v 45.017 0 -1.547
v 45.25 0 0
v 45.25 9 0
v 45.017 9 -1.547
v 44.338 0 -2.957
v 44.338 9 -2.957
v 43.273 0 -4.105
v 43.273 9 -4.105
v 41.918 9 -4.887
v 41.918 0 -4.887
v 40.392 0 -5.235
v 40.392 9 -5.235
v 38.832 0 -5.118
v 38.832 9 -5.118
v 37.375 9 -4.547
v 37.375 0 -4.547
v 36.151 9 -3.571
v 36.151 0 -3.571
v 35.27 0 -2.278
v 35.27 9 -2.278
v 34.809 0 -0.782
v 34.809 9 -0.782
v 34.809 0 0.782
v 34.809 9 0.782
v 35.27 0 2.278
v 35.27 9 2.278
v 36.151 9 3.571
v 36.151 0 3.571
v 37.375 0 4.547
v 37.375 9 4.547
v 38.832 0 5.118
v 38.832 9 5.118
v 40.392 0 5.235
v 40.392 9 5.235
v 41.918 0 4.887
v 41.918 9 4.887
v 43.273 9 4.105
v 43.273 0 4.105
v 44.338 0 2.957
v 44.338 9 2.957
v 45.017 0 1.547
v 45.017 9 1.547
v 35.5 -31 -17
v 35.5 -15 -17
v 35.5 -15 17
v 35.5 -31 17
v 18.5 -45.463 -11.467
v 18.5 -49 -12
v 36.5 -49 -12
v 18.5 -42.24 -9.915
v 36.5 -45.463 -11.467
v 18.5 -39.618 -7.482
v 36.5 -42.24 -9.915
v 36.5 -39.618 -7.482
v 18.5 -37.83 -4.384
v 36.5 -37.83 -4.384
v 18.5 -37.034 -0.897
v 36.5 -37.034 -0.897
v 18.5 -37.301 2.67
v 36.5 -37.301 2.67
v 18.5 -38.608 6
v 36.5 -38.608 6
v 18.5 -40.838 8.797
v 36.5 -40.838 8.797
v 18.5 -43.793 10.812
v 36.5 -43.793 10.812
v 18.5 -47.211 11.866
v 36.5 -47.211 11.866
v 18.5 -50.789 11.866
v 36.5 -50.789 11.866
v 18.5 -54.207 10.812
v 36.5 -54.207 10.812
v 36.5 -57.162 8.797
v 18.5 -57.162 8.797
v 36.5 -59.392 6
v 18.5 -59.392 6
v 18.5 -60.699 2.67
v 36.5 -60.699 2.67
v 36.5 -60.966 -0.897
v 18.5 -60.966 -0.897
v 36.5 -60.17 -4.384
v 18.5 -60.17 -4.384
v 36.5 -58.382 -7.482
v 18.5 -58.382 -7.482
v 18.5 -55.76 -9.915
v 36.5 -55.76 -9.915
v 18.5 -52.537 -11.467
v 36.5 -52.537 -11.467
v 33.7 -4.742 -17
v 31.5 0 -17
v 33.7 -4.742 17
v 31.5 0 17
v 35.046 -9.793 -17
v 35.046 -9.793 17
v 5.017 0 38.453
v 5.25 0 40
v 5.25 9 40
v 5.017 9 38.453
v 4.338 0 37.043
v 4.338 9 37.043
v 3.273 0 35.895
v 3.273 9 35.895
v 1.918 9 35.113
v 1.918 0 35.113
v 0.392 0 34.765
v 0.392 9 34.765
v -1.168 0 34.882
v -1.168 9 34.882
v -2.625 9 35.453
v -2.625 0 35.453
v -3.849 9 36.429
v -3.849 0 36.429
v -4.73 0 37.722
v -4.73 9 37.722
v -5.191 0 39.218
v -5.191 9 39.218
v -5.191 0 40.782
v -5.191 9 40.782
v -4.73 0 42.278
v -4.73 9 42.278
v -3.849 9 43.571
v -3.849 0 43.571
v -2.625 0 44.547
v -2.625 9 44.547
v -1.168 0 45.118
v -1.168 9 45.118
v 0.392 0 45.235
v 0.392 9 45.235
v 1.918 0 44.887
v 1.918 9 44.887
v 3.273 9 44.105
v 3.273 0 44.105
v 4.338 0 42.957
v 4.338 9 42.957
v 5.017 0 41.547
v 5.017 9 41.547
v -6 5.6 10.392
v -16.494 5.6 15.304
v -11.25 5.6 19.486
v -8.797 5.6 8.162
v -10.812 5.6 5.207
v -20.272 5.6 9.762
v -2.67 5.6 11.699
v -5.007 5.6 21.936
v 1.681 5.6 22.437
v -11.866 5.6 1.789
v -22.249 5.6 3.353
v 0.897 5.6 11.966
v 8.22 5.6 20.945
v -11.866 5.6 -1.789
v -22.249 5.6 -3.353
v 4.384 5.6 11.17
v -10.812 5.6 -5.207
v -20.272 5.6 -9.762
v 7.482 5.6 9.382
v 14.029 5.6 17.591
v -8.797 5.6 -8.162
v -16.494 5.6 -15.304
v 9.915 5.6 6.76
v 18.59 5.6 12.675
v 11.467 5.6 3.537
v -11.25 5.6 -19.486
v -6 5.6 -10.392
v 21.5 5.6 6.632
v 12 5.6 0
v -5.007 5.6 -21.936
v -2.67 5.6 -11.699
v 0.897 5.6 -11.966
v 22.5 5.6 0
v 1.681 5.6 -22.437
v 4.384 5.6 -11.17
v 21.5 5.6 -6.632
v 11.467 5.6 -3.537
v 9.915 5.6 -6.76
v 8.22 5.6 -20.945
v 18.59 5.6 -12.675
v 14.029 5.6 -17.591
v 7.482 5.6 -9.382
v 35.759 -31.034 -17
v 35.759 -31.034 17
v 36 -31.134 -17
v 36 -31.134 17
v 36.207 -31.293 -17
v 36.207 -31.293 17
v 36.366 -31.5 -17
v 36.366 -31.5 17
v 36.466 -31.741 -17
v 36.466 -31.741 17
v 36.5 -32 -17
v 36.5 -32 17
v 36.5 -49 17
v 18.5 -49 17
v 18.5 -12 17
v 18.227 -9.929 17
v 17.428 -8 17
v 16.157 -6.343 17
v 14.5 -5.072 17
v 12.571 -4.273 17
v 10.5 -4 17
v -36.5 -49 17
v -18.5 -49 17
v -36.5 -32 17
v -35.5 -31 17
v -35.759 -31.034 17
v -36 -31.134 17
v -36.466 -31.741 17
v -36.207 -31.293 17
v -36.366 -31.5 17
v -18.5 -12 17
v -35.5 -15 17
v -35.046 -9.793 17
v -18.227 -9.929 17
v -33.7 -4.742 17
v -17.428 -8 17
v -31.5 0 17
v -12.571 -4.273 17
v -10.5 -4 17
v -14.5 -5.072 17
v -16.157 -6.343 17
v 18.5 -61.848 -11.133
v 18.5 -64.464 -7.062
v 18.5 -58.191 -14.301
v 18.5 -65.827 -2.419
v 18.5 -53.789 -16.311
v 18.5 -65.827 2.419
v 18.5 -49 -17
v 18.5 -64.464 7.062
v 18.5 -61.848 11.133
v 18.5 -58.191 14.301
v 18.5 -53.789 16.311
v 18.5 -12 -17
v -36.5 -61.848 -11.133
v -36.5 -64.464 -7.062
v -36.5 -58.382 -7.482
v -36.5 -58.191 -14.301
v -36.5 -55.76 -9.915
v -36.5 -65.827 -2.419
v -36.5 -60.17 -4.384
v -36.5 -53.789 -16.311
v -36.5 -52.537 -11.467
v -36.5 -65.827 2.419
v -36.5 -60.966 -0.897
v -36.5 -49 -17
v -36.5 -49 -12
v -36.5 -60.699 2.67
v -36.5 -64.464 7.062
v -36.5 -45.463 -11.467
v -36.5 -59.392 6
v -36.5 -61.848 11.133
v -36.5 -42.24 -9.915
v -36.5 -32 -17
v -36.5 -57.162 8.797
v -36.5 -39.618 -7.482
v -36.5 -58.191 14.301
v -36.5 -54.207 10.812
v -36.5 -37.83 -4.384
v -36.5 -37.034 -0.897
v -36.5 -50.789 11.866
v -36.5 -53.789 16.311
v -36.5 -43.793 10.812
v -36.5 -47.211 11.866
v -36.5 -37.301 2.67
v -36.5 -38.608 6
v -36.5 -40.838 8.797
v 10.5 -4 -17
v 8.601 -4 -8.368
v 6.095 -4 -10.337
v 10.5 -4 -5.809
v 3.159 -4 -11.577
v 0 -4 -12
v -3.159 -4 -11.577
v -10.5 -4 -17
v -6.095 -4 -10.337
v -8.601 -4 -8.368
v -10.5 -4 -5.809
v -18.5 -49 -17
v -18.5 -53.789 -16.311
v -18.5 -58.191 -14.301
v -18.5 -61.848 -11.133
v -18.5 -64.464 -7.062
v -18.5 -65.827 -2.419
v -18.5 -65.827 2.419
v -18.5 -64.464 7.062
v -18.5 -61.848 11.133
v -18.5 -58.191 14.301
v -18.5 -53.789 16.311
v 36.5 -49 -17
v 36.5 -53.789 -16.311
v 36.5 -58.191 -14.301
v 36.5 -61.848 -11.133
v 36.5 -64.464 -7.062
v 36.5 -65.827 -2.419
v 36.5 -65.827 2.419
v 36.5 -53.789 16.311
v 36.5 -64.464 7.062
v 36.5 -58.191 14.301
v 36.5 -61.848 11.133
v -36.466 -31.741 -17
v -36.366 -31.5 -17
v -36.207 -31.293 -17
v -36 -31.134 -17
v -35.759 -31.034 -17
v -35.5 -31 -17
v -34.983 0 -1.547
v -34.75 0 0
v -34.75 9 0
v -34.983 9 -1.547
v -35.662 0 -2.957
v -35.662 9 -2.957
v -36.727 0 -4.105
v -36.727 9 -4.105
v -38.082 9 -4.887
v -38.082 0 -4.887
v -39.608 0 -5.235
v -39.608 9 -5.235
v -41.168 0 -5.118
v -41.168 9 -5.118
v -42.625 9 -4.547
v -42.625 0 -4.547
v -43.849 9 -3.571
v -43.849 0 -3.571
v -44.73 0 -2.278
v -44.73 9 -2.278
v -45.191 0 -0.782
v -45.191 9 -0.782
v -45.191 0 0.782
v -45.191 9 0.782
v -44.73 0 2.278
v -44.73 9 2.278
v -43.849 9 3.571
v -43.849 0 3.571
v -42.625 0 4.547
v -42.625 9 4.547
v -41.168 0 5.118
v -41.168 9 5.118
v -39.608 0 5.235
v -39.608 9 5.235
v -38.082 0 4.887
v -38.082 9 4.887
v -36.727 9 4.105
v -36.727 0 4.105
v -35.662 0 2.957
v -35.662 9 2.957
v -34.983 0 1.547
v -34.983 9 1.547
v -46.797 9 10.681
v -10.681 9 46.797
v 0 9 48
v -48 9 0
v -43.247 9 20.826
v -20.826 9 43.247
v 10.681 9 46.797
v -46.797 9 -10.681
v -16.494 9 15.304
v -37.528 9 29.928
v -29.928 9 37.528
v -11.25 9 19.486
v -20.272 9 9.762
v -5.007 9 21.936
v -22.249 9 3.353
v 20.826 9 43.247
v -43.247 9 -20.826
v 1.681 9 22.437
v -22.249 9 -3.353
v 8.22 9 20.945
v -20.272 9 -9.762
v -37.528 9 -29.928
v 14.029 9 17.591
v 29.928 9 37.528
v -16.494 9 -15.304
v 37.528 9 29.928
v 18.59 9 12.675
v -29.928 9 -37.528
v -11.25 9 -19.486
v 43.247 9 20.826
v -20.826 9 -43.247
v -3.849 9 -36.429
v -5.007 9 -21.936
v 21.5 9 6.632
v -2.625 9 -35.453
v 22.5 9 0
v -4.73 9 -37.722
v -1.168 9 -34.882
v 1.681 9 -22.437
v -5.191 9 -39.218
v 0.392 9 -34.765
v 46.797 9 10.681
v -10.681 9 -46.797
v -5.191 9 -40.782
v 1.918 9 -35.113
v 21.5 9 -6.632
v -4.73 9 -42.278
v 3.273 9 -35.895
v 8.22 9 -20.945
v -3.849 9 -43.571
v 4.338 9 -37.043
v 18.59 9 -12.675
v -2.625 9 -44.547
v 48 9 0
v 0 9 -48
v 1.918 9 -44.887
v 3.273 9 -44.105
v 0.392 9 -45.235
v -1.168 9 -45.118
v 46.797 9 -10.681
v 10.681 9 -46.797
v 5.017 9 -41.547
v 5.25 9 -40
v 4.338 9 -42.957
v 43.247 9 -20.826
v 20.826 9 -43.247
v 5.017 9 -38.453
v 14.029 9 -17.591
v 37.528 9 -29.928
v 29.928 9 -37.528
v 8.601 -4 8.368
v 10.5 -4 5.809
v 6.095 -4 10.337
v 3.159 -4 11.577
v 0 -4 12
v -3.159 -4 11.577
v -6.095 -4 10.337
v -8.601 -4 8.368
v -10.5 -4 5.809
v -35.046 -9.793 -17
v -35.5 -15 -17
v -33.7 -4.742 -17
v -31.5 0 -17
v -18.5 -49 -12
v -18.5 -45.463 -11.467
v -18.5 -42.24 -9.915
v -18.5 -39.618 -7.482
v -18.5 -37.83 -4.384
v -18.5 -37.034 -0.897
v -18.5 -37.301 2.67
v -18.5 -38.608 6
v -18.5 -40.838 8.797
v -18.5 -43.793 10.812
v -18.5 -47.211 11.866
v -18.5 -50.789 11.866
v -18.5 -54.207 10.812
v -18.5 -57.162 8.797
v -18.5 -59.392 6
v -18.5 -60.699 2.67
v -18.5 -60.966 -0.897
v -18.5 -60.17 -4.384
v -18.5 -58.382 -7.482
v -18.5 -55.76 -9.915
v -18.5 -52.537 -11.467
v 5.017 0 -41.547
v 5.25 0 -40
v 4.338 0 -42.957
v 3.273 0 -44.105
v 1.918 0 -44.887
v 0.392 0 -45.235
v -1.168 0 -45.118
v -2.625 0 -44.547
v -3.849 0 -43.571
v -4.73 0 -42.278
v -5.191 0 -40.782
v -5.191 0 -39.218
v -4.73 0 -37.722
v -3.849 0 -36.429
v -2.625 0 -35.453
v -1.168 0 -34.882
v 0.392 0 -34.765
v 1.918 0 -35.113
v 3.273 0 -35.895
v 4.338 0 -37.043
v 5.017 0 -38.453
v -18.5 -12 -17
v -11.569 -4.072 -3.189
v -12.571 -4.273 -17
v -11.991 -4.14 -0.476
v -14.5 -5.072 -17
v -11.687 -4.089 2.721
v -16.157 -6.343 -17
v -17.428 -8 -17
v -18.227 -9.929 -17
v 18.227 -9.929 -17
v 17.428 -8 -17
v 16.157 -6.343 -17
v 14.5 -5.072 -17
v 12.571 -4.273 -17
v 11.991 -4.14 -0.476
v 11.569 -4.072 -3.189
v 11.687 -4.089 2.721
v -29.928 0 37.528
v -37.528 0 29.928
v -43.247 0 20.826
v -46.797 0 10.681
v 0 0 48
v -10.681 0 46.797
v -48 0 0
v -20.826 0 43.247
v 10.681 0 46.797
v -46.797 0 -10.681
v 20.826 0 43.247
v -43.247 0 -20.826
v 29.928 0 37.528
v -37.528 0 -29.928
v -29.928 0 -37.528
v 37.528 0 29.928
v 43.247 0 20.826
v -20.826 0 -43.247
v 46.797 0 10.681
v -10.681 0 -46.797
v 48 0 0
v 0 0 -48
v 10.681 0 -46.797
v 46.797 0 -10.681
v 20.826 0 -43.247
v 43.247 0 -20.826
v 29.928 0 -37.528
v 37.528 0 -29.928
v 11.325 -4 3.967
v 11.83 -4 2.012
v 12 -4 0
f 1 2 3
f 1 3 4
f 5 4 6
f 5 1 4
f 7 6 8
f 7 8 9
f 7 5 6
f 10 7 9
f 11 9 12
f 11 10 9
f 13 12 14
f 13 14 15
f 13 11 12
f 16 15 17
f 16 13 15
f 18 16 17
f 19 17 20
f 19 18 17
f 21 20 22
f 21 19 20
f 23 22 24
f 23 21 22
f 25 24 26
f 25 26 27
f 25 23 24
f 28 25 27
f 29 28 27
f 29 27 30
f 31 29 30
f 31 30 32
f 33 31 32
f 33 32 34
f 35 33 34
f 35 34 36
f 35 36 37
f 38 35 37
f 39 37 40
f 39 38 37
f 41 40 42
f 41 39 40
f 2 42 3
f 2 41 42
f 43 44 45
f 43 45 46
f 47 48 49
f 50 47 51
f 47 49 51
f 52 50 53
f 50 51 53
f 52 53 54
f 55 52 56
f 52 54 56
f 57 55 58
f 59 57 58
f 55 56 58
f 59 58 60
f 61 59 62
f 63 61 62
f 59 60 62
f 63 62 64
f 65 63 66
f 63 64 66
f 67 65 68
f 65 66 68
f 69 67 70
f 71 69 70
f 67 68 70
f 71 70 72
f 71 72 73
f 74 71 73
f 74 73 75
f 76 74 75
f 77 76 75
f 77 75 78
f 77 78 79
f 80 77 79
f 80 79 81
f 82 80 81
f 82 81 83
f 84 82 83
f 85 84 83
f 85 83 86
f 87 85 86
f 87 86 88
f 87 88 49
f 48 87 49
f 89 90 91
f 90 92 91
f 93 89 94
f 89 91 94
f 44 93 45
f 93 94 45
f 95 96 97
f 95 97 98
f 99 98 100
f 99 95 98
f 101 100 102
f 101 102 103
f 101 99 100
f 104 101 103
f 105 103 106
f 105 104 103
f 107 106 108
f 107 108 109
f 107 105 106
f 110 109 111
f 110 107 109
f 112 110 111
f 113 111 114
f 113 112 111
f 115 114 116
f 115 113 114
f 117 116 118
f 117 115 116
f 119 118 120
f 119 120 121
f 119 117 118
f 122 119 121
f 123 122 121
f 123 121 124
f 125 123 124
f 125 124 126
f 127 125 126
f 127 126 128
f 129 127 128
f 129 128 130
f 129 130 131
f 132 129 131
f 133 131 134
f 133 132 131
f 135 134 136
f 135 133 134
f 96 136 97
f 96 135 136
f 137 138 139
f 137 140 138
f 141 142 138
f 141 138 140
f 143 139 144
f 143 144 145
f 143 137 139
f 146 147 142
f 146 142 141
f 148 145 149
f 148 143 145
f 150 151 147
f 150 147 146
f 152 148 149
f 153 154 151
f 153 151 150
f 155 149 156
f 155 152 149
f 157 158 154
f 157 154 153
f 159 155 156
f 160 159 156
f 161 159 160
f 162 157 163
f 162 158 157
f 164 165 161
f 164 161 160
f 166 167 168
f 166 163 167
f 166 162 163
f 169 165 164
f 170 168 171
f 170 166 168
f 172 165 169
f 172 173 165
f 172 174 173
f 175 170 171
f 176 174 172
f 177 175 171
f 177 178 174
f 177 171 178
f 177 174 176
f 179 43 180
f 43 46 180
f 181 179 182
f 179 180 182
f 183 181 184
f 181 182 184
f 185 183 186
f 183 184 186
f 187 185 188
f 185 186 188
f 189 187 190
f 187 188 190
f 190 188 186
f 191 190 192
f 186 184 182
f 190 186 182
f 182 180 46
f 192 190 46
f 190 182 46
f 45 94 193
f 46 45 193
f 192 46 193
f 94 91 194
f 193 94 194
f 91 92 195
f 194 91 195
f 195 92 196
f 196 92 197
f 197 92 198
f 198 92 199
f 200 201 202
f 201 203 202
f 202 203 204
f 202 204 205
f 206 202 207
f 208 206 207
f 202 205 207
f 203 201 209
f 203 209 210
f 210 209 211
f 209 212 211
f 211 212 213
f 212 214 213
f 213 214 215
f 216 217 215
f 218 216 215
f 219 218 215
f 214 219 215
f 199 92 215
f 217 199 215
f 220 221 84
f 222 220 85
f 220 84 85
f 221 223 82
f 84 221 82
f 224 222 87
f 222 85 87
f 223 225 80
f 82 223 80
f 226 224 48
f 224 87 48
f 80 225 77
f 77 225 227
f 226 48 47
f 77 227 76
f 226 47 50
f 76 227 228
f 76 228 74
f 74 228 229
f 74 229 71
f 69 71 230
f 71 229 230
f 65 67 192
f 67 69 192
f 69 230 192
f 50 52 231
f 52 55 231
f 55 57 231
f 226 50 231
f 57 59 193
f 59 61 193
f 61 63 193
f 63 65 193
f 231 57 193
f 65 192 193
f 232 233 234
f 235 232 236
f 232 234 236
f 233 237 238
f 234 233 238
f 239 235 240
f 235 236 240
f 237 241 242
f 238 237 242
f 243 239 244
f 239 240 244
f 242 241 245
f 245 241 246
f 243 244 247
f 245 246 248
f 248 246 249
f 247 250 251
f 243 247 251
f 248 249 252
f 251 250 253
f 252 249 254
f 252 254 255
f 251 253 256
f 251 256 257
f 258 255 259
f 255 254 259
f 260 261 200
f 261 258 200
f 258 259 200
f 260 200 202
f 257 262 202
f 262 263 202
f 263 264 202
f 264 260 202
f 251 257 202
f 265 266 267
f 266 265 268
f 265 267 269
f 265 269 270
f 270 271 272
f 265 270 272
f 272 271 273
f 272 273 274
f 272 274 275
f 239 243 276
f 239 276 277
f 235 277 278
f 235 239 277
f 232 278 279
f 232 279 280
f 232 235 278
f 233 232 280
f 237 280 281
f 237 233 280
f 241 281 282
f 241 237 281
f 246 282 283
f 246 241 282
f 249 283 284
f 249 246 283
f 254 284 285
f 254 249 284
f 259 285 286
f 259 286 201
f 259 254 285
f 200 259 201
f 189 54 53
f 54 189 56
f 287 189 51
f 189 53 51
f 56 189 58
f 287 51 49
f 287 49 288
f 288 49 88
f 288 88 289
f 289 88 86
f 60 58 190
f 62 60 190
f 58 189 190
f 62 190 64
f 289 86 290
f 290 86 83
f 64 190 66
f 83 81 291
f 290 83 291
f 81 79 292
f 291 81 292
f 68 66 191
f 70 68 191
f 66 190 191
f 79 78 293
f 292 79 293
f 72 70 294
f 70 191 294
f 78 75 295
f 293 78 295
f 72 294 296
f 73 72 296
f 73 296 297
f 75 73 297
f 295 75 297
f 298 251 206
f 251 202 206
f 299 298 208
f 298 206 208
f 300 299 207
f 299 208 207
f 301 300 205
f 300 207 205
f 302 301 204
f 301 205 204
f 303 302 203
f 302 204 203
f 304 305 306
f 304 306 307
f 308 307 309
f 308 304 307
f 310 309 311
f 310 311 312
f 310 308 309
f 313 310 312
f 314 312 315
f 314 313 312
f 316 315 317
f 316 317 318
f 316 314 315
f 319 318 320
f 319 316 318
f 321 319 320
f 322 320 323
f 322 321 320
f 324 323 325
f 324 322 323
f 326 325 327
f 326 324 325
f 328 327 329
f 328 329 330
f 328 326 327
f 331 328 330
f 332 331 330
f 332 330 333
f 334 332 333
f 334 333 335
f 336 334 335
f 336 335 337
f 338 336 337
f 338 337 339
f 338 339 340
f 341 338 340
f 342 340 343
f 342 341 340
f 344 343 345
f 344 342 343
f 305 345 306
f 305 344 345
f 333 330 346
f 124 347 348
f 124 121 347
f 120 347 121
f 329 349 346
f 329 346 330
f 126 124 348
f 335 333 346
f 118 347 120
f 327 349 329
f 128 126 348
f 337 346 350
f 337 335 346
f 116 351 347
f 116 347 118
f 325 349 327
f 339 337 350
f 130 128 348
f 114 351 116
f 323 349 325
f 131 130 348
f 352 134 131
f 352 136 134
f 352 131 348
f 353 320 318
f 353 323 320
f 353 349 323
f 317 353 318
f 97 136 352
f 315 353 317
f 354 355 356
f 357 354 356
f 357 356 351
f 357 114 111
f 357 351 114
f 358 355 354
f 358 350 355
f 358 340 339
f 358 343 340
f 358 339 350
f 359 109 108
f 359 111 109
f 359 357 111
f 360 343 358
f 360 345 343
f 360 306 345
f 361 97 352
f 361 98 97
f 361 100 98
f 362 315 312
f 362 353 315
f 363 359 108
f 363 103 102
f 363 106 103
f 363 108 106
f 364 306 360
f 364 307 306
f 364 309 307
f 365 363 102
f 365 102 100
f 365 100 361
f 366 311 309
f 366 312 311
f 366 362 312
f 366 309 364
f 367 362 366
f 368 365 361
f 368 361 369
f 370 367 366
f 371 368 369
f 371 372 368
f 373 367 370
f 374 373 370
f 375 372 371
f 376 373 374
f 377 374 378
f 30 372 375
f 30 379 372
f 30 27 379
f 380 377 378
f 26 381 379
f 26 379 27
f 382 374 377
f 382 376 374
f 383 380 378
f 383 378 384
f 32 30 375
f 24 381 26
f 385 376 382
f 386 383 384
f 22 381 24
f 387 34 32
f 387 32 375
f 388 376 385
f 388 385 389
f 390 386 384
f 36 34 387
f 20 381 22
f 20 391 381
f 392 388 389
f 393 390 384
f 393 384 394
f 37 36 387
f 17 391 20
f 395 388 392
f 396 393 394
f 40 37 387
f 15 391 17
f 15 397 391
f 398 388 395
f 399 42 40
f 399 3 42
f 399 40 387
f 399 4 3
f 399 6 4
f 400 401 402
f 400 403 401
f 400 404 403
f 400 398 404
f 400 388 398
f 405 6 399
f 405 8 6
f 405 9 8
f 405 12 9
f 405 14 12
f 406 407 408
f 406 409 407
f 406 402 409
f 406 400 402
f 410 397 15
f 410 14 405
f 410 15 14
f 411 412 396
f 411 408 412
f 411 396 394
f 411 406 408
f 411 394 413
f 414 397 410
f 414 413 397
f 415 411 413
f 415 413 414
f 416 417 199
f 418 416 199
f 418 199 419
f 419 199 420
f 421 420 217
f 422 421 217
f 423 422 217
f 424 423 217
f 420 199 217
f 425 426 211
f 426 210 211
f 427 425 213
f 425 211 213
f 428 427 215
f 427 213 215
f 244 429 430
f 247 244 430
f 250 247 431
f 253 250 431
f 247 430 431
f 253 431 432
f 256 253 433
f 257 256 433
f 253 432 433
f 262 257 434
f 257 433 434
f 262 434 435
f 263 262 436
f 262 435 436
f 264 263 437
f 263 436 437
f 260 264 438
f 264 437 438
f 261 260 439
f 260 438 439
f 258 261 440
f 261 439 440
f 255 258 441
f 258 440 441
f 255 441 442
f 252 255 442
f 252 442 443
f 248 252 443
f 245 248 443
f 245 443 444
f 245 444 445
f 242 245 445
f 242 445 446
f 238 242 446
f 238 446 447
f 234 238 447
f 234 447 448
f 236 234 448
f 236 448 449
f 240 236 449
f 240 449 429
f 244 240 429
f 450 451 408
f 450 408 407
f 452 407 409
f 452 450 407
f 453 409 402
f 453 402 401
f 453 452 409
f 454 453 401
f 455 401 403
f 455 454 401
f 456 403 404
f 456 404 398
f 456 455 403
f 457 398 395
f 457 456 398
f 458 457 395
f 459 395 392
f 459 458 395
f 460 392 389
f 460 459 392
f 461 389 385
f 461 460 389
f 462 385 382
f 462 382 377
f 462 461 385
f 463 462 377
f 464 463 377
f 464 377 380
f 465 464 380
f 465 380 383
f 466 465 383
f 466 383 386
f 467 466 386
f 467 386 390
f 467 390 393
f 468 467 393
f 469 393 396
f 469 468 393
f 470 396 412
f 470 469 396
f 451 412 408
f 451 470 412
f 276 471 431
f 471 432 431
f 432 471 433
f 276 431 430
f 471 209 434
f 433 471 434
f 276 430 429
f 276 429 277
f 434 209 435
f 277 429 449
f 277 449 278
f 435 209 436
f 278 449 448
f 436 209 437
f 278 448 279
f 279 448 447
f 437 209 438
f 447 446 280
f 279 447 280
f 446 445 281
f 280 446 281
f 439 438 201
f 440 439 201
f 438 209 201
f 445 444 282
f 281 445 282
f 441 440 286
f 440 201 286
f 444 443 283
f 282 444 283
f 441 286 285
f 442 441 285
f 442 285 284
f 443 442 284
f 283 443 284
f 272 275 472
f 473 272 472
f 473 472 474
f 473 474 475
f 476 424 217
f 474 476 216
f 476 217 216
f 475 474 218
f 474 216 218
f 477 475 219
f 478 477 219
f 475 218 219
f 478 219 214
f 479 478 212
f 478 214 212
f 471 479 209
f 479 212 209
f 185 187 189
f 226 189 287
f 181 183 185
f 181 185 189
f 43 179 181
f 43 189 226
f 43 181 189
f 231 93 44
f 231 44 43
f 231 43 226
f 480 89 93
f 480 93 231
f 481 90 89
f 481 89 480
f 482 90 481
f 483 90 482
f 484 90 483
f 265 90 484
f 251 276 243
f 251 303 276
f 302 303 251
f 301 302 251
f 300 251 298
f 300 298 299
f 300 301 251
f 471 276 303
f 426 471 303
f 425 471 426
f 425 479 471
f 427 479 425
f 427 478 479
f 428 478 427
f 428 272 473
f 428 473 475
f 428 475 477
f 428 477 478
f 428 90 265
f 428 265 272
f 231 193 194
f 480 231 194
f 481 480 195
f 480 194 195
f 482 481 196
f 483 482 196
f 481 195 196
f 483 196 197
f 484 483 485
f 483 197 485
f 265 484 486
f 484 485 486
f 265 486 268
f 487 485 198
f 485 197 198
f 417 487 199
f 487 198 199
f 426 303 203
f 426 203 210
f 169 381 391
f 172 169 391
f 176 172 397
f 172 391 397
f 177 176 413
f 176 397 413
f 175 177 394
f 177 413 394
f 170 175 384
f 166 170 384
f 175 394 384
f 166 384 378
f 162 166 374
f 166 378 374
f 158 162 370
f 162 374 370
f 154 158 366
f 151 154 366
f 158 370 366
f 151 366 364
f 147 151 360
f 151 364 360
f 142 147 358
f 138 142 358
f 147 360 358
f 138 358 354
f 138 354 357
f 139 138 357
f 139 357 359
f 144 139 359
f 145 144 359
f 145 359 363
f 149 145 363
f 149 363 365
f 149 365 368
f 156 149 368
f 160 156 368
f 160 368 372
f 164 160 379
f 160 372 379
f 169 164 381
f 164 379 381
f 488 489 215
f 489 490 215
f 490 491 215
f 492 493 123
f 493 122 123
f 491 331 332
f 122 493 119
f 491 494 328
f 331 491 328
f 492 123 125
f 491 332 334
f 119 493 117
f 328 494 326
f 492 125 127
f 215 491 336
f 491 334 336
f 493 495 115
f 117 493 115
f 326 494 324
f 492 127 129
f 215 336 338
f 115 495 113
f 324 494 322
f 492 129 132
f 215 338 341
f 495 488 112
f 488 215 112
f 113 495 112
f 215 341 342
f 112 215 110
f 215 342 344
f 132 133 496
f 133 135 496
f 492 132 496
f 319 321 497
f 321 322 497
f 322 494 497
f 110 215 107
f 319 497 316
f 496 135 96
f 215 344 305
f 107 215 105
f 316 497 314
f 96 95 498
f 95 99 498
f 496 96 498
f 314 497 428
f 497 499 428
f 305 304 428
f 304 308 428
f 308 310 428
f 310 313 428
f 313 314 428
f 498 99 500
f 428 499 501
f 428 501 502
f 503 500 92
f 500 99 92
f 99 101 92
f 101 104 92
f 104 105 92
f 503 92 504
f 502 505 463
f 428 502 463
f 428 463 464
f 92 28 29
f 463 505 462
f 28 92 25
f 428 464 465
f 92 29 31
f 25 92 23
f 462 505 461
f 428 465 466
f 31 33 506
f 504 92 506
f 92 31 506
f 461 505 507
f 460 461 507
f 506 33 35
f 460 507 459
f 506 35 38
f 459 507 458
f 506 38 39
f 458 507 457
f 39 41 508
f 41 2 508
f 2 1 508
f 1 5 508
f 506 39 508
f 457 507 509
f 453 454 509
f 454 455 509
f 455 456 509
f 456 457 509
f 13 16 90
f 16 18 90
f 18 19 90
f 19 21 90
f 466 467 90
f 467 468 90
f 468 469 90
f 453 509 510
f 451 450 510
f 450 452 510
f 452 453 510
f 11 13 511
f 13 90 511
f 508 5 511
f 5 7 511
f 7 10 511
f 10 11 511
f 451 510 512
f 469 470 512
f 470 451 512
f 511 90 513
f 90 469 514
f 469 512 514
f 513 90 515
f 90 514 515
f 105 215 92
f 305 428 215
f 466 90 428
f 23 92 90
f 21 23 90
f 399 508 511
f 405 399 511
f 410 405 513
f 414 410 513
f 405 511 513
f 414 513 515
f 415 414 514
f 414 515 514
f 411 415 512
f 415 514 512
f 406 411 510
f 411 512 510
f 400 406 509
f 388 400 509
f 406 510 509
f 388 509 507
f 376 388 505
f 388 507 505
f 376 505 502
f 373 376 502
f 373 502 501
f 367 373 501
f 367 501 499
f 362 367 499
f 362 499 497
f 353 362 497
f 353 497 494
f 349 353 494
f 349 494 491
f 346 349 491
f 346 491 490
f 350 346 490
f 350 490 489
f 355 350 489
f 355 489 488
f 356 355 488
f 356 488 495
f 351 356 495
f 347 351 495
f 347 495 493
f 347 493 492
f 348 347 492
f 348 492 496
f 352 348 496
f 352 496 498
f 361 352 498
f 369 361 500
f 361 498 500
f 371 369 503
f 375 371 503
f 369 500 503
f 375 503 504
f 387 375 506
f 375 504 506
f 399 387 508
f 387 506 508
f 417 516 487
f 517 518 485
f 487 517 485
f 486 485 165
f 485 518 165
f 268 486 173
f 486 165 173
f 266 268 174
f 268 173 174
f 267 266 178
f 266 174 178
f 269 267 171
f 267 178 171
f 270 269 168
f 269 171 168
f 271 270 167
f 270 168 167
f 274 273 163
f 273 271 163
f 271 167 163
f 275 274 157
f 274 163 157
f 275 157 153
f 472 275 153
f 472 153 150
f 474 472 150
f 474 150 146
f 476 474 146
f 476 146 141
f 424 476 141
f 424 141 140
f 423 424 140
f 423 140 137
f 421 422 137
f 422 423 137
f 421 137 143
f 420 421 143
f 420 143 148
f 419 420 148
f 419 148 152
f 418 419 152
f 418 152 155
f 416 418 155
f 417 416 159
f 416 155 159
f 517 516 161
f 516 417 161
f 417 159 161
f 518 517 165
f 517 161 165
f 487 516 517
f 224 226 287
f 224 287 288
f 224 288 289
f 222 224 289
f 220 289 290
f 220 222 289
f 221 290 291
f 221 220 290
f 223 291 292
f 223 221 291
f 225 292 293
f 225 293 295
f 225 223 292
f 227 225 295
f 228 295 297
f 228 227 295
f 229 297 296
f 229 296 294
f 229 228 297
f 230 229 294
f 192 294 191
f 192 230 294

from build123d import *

# Parameters (mm, degrees)
SKETCH1_R                = 48
SKETCH1_R_2              = 5.25
BOSS_EXTRUDE1_DEPTH      = 9
SKETCH2_R                = 22.5
CUT_EXTRUDE1_DEPTH       = 3.4
SKETCH3_R                = 12
CUT_EXTRUDE2_DEPTH       = 6.6
BOSS_EXTRUDE2_DEPTH      = 17
BOSS_EXTRUDE2_DEPTH_BACK = 17
SKETCH5_R                = 12
CUT_EXTRUDE3_DEPTH       = 4.5
CUT_EXTRUDE3_DEPTH_BACK  = 4.5
CUT_EXTRUDE4_DEPTH       = 12.5
CUT_EXTRUDE4_DEPTH_BACK  = 85.5
SKETCH8_R                = 12
CUT_EXTRUDE5_DEPTH       = 12.5
CUT_EXTRUDE5_DEPTH_BACK  = 85.5


with BuildPart() as part:
    # Sketch1 → Boss-Extrude1 (new body)
    with BuildSketch(Plane(origin=(0, 0, 0), x_dir=(1, 0, 0), z_dir=(0, 1, 0))):
        Circle(SKETCH1_R)
        with Locations((0, 40)):
            Circle(SKETCH1_R_2, mode=Mode.SUBTRACT)
        with Locations((40, 0)):
            Circle(SKETCH1_R_2, mode=Mode.SUBTRACT)
        with Locations((0, -40)):
            Circle(SKETCH1_R_2, mode=Mode.SUBTRACT)
        with Locations((-40, 0)):
            Circle(SKETCH1_R_2, mode=Mode.SUBTRACT)
    extrude(amount=BOSS_EXTRUDE1_DEPTH)

    # Sketch2 → Cut-Extrude1 (cut)
    with BuildSketch(Plane(origin=(0, 9, 0), x_dir=(1, 0, 0), z_dir=(0, 1, 0))):
        Circle(SKETCH2_R)
    extrude(amount=-CUT_EXTRUDE1_DEPTH, mode=Mode.SUBTRACT)

    # Sketch3 → Cut-Extrude2 (cut, through all)
    with BuildSketch(Plane(origin=(0, 5.6, 0), x_dir=(1, 0, 0), z_dir=(0, 1, 0))):
        Circle(SKETCH3_R)
    extrude(amount=-CUT_EXTRUDE2_DEPTH, mode=Mode.SUBTRACT)

    # Sketch4 → Boss-Extrude2 (add, two sides)
    with BuildSketch(Plane.XY) as boss_extrude2_sk:
        with BuildLine():
            Line((-36.5, -66), (-36.5, -32))
            ThreePointArc((-36.5, -32), (-36.207106781, -31.292893219), (-35.5, -31))
            Line((-35.5, -31), (-35.5, -15))
            ThreePointArc((-35.5, -15), (-34.482827555, -7.237912652), (-31.5, 0))
            Line((-31.5, 0), (31.5, 0))
            ThreePointArc((31.5, 0), (34.482827555, -7.237912652), (35.5, -15))
            Line((35.5, -15), (35.5, -31))
            ThreePointArc((35.5, -31), (36.207106781, -31.292893219), (36.5, -32))
            Line((36.5, -32), (36.5, -66))
            ThreePointArc((36.5, -66), (36.207106781, -66.707106781), (35.5, -67))
            Line((35.5, -67), (19.5, -67))
            ThreePointArc((19.5, -67), (18.792893219, -66.707106781), (18.5, -66))
            Line((18.5, -66), (18.5, -12))
            ThreePointArc((18.5, -12), (16.156854249, -6.343145751), (10.5, -4))
            Line((10.5, -4), (-10.5, -4))
            ThreePointArc((-10.5, -4), (-16.156854249, -6.343145751), (-18.5, -12))
            Line((-18.5, -12), (-18.5, -66))
            ThreePointArc((-18.5, -66), (-18.792893219, -66.707106781), (-19.5, -67))
            Line((-19.5, -67), (-35.5, -67))
            ThreePointArc((-35.5, -67), (-36.207106781, -66.707106781), (-36.5, -66))
        make_face()
    extrude(amount=BOSS_EXTRUDE2_DEPTH)
    extrude(boss_extrude2_sk.sketch, amount=-BOSS_EXTRUDE2_DEPTH_BACK)

    # Sketch5 → Cut-Extrude3 (cut, two sides)
    with BuildSketch(Plane.XZ.offset(4)) as cut_extrude3_sk:
        Circle(SKETCH5_R)
    extrude(amount=CUT_EXTRUDE3_DEPTH, mode=Mode.SUBTRACT)
    extrude(cut_extrude3_sk.sketch, amount=-CUT_EXTRUDE3_DEPTH_BACK, mode=Mode.SUBTRACT)

    # Sketch7 → Cut-Extrude4 (cut, two sides)
    with BuildSketch(Plane.ZY.offset(36.5)) as cut_extrude4_sk:
        with BuildLine():
            Line((-17, 0), (-17, -49))
            ThreePointArc((-17, -49), (0, -66), (17, -49))
            Line((17, -49), (17, 0))
            Line((17, 0), (31.554606814, 0))
            Line((31.554606814, 0), (31.554606814, -74.298240475))
            Line((31.554606814, -74.298240475), (-29.742859054, -74.298240475))
            Line((-29.742859054, -74.298240475), (-29.742859054, 0))
            Line((-29.742859054, 0), (-17, 0))
        make_face()
    extrude(amount=CUT_EXTRUDE4_DEPTH, mode=Mode.SUBTRACT)
    extrude(cut_extrude4_sk.sketch, amount=-CUT_EXTRUDE4_DEPTH_BACK, mode=Mode.SUBTRACT)

    # Sketch8 → Cut-Extrude5 (cut, two sides)
    with BuildSketch(Plane(origin=(36.5, 0, 0), x_dir=(0, 0, -1), z_dir=(1, 0, 0))) as cut_extrude5_sk:
        with Locations((0, -49)):
            Circle(SKETCH8_R)
    extrude(amount=CUT_EXTRUDE5_DEPTH, mode=Mode.SUBTRACT)
    extrude(cut_extrude5_sk.sketch, amount=-CUT_EXTRUDE5_DEPTH_BACK, mode=Mode.SUBTRACT)


solid = part.part
